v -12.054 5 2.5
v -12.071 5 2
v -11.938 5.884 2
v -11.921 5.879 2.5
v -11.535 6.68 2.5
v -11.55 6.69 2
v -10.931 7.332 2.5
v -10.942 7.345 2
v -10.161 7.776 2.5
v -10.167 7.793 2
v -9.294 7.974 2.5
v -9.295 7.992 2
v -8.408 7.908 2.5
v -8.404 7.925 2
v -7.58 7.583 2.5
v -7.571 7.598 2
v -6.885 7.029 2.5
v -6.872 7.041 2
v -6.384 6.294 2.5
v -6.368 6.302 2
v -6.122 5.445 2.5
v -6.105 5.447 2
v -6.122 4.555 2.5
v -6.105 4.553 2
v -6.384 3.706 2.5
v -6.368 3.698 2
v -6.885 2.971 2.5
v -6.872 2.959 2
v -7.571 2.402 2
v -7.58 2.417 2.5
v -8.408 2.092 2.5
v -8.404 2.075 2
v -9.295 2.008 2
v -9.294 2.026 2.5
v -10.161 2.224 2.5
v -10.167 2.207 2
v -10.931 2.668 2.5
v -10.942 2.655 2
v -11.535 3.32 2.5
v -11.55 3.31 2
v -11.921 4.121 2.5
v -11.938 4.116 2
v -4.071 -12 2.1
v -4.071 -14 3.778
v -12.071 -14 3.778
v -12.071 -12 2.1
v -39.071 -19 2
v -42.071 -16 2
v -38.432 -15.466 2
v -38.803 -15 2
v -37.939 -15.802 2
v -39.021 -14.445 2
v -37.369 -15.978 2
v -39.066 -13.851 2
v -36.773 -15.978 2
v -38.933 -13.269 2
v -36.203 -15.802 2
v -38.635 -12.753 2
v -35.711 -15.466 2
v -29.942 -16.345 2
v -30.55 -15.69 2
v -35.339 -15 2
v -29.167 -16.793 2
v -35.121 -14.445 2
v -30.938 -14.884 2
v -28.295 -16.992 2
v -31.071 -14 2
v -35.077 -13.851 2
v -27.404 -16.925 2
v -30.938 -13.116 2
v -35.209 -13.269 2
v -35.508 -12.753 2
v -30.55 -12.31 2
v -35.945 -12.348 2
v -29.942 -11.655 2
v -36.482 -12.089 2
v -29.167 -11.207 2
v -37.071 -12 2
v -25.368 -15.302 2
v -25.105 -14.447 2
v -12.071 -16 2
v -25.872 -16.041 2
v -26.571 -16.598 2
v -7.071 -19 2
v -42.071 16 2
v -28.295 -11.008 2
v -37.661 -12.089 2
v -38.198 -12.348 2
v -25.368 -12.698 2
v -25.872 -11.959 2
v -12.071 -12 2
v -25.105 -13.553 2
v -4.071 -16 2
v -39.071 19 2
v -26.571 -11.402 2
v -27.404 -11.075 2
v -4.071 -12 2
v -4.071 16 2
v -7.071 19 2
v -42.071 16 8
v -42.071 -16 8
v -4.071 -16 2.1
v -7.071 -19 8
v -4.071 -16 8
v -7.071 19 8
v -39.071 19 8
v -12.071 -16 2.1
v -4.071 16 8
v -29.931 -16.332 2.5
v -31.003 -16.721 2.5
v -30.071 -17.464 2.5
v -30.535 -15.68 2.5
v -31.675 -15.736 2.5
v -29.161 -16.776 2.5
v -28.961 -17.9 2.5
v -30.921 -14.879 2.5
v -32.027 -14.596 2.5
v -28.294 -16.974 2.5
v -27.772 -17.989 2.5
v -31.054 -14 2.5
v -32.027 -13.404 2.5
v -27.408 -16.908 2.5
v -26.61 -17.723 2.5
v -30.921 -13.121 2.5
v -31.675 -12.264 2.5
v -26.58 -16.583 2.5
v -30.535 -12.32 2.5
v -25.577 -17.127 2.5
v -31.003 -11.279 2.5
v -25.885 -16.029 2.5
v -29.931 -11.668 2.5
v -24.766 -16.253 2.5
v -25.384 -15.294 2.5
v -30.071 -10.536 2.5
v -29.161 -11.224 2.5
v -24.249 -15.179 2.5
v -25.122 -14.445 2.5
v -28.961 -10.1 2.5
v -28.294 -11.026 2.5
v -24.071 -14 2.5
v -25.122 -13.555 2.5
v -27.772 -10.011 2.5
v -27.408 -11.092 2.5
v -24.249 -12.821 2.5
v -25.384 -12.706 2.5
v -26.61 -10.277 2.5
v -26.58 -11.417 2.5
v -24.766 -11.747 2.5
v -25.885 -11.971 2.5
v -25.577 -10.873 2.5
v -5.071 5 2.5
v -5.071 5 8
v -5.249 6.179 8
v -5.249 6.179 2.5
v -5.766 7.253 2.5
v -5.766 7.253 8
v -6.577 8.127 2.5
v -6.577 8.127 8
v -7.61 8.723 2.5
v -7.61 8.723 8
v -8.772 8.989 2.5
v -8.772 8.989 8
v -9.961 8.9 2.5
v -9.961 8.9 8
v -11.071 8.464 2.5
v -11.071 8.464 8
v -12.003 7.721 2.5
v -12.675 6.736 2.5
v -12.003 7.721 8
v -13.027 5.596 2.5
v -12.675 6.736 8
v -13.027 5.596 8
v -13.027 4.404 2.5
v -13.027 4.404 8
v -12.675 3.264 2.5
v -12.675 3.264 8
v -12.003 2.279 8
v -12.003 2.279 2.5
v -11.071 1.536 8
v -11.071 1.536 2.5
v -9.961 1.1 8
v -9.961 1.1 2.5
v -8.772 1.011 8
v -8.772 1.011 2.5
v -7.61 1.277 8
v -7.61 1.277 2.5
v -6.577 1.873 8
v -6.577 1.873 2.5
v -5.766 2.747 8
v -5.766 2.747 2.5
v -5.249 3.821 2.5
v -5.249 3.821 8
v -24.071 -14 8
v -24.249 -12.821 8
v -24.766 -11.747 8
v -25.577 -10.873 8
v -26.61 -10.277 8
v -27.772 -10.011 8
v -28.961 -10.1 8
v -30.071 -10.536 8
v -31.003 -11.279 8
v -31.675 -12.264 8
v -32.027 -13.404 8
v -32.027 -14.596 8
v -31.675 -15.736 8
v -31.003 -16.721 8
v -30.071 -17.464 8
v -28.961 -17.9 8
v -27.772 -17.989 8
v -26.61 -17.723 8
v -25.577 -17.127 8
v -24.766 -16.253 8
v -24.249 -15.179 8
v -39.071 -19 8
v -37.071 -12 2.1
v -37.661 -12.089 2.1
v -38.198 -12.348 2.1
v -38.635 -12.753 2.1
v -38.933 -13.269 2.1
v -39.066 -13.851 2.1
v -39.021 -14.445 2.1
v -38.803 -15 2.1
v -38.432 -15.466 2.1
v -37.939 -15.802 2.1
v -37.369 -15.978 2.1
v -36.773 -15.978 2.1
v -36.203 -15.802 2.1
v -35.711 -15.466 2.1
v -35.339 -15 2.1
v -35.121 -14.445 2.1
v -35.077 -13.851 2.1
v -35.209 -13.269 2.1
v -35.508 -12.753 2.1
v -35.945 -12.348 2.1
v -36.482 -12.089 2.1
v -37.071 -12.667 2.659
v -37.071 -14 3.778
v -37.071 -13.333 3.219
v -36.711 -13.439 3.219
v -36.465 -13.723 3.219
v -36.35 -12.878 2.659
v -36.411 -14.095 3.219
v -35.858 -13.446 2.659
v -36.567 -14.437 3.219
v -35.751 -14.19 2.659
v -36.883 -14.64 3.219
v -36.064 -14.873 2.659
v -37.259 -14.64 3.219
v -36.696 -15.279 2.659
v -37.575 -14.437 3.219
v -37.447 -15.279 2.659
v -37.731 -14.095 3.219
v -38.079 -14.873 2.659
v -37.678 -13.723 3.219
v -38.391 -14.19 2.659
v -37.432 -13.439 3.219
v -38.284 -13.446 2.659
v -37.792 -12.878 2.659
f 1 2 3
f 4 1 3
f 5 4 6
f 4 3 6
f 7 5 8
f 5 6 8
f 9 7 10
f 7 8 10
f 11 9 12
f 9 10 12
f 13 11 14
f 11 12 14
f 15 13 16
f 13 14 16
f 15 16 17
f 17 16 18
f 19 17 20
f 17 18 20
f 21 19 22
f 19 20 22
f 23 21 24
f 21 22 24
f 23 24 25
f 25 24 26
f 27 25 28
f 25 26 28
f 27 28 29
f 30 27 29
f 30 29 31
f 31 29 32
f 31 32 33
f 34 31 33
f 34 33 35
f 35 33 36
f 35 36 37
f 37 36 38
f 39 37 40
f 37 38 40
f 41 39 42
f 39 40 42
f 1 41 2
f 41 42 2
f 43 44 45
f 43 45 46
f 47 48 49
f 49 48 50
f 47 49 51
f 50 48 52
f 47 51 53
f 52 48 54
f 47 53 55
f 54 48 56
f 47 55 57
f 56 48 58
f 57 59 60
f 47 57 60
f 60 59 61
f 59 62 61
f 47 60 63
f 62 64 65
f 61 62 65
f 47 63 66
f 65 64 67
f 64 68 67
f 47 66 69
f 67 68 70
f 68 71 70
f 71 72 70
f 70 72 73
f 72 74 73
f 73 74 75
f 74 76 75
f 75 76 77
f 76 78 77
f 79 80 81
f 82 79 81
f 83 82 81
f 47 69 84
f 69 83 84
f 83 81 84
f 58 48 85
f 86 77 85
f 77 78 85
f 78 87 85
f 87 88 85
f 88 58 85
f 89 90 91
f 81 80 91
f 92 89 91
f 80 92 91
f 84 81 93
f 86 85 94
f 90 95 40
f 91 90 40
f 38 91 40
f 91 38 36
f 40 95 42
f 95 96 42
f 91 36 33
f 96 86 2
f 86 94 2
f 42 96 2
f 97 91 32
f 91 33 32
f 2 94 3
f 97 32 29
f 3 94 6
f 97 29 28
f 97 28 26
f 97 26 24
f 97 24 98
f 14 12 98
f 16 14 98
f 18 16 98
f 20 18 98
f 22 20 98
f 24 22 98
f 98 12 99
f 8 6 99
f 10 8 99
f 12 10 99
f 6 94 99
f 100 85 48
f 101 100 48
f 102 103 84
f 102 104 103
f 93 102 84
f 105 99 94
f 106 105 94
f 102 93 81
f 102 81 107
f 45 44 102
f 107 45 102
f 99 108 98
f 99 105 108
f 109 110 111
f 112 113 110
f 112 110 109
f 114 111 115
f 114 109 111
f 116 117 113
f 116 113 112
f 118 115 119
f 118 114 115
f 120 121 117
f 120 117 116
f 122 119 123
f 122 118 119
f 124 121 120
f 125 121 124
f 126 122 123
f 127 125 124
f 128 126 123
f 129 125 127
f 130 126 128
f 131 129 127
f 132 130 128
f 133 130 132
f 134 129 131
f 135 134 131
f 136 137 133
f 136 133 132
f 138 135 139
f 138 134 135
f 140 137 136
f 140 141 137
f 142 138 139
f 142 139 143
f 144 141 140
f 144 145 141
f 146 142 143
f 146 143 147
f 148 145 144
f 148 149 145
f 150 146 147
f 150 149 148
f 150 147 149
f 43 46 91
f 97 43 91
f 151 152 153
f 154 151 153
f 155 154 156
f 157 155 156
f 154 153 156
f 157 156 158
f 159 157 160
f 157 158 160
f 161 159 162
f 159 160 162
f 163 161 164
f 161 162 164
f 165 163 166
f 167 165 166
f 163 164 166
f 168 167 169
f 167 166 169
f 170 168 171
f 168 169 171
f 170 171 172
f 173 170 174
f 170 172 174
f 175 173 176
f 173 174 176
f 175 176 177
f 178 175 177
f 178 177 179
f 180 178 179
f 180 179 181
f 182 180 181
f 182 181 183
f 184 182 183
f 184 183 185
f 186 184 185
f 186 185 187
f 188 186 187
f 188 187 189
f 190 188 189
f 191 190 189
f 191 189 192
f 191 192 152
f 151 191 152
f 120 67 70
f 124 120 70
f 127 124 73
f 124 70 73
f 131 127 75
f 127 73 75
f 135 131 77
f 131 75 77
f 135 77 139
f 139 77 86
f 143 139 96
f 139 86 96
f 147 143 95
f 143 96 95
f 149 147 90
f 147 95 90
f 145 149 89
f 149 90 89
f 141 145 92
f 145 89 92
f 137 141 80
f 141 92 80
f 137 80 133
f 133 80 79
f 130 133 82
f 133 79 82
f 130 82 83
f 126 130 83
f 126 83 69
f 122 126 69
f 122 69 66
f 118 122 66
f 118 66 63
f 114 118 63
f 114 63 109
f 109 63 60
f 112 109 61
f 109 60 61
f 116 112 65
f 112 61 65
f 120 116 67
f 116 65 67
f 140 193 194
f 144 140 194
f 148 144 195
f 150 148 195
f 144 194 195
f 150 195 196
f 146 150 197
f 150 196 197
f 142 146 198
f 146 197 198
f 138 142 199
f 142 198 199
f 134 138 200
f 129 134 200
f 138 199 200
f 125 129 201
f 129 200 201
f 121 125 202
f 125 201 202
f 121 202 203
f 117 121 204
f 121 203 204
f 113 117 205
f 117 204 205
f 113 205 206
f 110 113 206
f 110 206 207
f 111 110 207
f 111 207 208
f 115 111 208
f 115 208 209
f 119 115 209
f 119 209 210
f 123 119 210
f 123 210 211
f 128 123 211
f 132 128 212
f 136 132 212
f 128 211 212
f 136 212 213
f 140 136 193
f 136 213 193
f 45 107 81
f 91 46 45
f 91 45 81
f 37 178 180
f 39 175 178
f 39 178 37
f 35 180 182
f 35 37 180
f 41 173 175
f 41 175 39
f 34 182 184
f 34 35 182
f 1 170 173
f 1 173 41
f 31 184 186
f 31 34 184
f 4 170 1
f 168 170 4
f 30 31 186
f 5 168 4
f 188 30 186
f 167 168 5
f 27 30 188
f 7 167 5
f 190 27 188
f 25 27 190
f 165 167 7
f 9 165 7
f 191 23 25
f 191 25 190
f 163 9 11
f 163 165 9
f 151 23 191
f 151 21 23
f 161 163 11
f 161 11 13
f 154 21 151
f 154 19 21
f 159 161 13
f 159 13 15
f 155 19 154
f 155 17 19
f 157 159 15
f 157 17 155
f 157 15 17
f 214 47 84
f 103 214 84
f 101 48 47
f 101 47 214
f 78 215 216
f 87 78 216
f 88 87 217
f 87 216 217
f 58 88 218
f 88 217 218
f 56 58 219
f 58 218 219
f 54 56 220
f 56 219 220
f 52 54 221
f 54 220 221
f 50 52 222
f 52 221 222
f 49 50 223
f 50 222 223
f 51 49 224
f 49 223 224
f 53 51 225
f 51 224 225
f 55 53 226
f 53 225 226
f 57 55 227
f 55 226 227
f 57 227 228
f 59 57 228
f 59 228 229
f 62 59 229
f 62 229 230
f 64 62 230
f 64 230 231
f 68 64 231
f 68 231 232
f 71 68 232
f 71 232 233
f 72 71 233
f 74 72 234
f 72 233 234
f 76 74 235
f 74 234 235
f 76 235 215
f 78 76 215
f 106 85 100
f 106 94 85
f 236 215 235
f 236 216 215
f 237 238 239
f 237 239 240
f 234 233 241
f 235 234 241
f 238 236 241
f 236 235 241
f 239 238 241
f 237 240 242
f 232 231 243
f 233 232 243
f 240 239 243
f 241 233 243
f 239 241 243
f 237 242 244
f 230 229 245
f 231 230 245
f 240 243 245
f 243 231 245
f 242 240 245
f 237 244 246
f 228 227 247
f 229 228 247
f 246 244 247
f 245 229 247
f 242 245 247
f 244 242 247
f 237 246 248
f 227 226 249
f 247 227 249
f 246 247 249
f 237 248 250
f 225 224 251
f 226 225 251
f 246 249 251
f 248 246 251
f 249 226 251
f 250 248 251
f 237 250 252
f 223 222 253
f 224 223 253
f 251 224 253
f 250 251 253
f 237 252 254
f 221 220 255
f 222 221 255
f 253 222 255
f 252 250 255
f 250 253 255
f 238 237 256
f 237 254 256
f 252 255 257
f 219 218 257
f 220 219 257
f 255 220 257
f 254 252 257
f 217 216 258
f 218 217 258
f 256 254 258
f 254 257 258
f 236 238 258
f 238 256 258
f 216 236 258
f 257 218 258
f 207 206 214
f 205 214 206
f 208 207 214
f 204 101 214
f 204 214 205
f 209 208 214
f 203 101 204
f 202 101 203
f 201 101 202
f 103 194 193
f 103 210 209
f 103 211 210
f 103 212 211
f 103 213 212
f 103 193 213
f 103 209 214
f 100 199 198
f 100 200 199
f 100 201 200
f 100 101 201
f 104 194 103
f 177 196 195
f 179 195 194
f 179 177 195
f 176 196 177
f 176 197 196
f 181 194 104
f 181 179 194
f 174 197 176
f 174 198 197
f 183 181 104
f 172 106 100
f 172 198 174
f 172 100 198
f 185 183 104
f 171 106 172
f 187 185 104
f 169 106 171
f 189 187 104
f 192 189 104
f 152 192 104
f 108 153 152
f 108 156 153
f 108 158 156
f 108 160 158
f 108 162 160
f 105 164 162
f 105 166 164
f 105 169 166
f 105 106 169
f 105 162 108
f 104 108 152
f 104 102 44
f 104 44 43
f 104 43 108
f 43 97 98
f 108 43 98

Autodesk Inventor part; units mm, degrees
ref_plane "YZ Plane" through (0, 0, 0) normal (1, 0, 0) x (0, 1, 0)
ref_plane "XZ Plane" through (0, 0, 0) normal (0, 1, 0) x (-1, 0, 0)
ref_plane "XY Plane" through (0, 0, 0) normal (0, 0, 1) x (1, 0, 0)
ref_plane "Work Plane1" through (0, 0, 2) normal (0, 0, 1) x (1, 0, 0)
sketch "Sketch1" plane through (0, 0, 2) normal (0, 0, 1) x (1, 0, 0)
  line L0 (-37.0712, 14) -> (-9.0712, 14) construction
  line L1 (-9.0712, 14) -> (-9.0712, -14) construction
  line L2 (-9.0712, -14) -> (-37.0712, -14) construction
  line L3 (-37.0712, -14) -> (-37.0712, 14) construction
  line L4 (-4.0712, -19) -> (-4.0712, 19)
  line L5 (-4.0712, 19) -> (-42.0712, 19)
  line L6 (-42.0712, 19) -> (-42.0712, -19)
  line L7 (-42.0712, -19) -> (-4.0712, -19)
  circle A0 centre (-23.0712, 0) radius 12.8
  point P0 (0, 0)
  dimension "d0" = 5
extrude "Extrusion1" add sketch "Sketch1" along normal blind 6 contours L7 L6 L5 L4 | A0
sketch "Sketch3" plane through (0, 0, 2) normal (0, 0, -1) x (-1, 0, 0)
  circle A0 centre (9.0712, -14) radius 1.45 construction
  circle A1 centre (9.0712, -14) radius 2.45
  circle A2 centre (37.0712, -14) radius 1.45 projected
  circle A3 centre (37.0712, -14) radius 1.95
  point P0 (0, 0)
  dimension "d8" = 1
  dimension "d10" = 0.5
chamfer "Chamfer1" distance 3 angle 45 4 edges at (-42.0712, 19, 5) (-4.0712, 19, 5) (-4.0712, -19, 5) (-42.0712, -19, 5)
hole "Hole1" at (-37.0712, -14, 2) direction (0, 0, 1) diameter 4 depth 0.1 tip angle 100
sketch "Sketch4" plane through (-4.0712, -19, 2) normal (1, 0, 0) x (0, 0, -1)
  line L0 (2, 4.45) -> (6, 4.45)
  line L1 (2, 1.55) -> (6, 1.55)
  line L2 (0, 0) -> (0, 38) projected
  arc A0 (2, 19) -> (2, 19) centre (1.5, 4.4206) ccw projected
  line L3 (-1.7782, 5) -> (-0.1, 7) projected
  line L4 (-1.7782, 5) -> (-0.1, 3) projected
  line L5 (-0.1, 7) -> (0.6045, 7)
  line L6 (0.6045, 7) -> (0.6045, 3)
  line L7 (0.6045, 3) -> (-0.1, 3)
  line L8 (-0.1, 3) -> (-0.1, 7)
extrude "Extrusion4" cut sketch "Sketch4" against normal blind 8 contours L7 L8 L5 L2 | L2 L5 L6 L7 | L4 L3 L8
ref_plane "Arbeitsebene2" through (-23.0712, -12, 2) normal (1, 0, 0) x (0, 0, -1)
ref_plane "Arbeitsebene3" through (-39.0712, 0, 2) normal (0, -1, 0) x (1, 0, 0)
sketch "Skizze9" plane through (0, 0, 2) normal (0, 0, -1) x (-1, 0, 0)
  line L0 (12.0712, -16) -> (4.0712, -16) projected
  line L1 (7.0712, -19) -> (4.0712, -16) projected
  line L2 (39.0712, -19) -> (7.0712, -19) projected
  line L3 (42.0712, -16) -> (39.0712, -19) projected
  line L4 (42.0712, 16) -> (42.0712, -16) projected
  line L5 (39.0712, 19) -> (42.0712, 16) projected
  line L6 (7.0712, 19) -> (39.0712, 19) projected
  line L7 (4.0712, 16) -> (7.0712, 19) projected
  line L8 (4.0712, -12) -> (4.0712, 16) projected
  line L9 (4.0712, -12) -> (12.0712, -12) projected
  line L10 (12.0712, -12) -> (12.0712, -16) projected
  circle A0 centre (37.0712, -14) radius 2 projected
  circle A1 centre (28.0712, -14) radius 3
  circle A2 centre (9.0712, 5) radius 3
  point P0 (0, 0)
  dimension "d54" = 6
  dimension "d55" = 6
  dimension "d56" = 14
  dimension "d57" = 5
  dimension "d58" = 5
  dimension "d59" = 14
extrude "Extrusion9" cut sketch "Skizze9" against normal blind 3 draft -2 contours A1 | A2
sketch "Skizze10" plane through (0, 0, 8) normal (0, 0, 1) x (1, 0, 0)
  circle A0 centre (-9.0712, 5) radius 4.05 projected
  circle A1 centre (-28.0712, -14) radius 4.55 projected
  circle A2 centre (-9.0712, 5) radius 4
  circle A3 centre (-28.0712, -14) radius 2.8952 projected
  circle A4 centre (-28.0712, -14) radius 4
  point P0 (0, 0)
  dimension "d62" = 8
  dimension "d63" = 8
extrude "Extrusion10" cut sketch "Skizze10" against normal blind 5.5 contours A2 | A3 | A4
equation "\"d54\" = d55"
equation "\"d59\" = d56"
properties part number "20_Cube_Insert_Kinematic_Astromedia_30x40x1_45_pro_magnetic"
